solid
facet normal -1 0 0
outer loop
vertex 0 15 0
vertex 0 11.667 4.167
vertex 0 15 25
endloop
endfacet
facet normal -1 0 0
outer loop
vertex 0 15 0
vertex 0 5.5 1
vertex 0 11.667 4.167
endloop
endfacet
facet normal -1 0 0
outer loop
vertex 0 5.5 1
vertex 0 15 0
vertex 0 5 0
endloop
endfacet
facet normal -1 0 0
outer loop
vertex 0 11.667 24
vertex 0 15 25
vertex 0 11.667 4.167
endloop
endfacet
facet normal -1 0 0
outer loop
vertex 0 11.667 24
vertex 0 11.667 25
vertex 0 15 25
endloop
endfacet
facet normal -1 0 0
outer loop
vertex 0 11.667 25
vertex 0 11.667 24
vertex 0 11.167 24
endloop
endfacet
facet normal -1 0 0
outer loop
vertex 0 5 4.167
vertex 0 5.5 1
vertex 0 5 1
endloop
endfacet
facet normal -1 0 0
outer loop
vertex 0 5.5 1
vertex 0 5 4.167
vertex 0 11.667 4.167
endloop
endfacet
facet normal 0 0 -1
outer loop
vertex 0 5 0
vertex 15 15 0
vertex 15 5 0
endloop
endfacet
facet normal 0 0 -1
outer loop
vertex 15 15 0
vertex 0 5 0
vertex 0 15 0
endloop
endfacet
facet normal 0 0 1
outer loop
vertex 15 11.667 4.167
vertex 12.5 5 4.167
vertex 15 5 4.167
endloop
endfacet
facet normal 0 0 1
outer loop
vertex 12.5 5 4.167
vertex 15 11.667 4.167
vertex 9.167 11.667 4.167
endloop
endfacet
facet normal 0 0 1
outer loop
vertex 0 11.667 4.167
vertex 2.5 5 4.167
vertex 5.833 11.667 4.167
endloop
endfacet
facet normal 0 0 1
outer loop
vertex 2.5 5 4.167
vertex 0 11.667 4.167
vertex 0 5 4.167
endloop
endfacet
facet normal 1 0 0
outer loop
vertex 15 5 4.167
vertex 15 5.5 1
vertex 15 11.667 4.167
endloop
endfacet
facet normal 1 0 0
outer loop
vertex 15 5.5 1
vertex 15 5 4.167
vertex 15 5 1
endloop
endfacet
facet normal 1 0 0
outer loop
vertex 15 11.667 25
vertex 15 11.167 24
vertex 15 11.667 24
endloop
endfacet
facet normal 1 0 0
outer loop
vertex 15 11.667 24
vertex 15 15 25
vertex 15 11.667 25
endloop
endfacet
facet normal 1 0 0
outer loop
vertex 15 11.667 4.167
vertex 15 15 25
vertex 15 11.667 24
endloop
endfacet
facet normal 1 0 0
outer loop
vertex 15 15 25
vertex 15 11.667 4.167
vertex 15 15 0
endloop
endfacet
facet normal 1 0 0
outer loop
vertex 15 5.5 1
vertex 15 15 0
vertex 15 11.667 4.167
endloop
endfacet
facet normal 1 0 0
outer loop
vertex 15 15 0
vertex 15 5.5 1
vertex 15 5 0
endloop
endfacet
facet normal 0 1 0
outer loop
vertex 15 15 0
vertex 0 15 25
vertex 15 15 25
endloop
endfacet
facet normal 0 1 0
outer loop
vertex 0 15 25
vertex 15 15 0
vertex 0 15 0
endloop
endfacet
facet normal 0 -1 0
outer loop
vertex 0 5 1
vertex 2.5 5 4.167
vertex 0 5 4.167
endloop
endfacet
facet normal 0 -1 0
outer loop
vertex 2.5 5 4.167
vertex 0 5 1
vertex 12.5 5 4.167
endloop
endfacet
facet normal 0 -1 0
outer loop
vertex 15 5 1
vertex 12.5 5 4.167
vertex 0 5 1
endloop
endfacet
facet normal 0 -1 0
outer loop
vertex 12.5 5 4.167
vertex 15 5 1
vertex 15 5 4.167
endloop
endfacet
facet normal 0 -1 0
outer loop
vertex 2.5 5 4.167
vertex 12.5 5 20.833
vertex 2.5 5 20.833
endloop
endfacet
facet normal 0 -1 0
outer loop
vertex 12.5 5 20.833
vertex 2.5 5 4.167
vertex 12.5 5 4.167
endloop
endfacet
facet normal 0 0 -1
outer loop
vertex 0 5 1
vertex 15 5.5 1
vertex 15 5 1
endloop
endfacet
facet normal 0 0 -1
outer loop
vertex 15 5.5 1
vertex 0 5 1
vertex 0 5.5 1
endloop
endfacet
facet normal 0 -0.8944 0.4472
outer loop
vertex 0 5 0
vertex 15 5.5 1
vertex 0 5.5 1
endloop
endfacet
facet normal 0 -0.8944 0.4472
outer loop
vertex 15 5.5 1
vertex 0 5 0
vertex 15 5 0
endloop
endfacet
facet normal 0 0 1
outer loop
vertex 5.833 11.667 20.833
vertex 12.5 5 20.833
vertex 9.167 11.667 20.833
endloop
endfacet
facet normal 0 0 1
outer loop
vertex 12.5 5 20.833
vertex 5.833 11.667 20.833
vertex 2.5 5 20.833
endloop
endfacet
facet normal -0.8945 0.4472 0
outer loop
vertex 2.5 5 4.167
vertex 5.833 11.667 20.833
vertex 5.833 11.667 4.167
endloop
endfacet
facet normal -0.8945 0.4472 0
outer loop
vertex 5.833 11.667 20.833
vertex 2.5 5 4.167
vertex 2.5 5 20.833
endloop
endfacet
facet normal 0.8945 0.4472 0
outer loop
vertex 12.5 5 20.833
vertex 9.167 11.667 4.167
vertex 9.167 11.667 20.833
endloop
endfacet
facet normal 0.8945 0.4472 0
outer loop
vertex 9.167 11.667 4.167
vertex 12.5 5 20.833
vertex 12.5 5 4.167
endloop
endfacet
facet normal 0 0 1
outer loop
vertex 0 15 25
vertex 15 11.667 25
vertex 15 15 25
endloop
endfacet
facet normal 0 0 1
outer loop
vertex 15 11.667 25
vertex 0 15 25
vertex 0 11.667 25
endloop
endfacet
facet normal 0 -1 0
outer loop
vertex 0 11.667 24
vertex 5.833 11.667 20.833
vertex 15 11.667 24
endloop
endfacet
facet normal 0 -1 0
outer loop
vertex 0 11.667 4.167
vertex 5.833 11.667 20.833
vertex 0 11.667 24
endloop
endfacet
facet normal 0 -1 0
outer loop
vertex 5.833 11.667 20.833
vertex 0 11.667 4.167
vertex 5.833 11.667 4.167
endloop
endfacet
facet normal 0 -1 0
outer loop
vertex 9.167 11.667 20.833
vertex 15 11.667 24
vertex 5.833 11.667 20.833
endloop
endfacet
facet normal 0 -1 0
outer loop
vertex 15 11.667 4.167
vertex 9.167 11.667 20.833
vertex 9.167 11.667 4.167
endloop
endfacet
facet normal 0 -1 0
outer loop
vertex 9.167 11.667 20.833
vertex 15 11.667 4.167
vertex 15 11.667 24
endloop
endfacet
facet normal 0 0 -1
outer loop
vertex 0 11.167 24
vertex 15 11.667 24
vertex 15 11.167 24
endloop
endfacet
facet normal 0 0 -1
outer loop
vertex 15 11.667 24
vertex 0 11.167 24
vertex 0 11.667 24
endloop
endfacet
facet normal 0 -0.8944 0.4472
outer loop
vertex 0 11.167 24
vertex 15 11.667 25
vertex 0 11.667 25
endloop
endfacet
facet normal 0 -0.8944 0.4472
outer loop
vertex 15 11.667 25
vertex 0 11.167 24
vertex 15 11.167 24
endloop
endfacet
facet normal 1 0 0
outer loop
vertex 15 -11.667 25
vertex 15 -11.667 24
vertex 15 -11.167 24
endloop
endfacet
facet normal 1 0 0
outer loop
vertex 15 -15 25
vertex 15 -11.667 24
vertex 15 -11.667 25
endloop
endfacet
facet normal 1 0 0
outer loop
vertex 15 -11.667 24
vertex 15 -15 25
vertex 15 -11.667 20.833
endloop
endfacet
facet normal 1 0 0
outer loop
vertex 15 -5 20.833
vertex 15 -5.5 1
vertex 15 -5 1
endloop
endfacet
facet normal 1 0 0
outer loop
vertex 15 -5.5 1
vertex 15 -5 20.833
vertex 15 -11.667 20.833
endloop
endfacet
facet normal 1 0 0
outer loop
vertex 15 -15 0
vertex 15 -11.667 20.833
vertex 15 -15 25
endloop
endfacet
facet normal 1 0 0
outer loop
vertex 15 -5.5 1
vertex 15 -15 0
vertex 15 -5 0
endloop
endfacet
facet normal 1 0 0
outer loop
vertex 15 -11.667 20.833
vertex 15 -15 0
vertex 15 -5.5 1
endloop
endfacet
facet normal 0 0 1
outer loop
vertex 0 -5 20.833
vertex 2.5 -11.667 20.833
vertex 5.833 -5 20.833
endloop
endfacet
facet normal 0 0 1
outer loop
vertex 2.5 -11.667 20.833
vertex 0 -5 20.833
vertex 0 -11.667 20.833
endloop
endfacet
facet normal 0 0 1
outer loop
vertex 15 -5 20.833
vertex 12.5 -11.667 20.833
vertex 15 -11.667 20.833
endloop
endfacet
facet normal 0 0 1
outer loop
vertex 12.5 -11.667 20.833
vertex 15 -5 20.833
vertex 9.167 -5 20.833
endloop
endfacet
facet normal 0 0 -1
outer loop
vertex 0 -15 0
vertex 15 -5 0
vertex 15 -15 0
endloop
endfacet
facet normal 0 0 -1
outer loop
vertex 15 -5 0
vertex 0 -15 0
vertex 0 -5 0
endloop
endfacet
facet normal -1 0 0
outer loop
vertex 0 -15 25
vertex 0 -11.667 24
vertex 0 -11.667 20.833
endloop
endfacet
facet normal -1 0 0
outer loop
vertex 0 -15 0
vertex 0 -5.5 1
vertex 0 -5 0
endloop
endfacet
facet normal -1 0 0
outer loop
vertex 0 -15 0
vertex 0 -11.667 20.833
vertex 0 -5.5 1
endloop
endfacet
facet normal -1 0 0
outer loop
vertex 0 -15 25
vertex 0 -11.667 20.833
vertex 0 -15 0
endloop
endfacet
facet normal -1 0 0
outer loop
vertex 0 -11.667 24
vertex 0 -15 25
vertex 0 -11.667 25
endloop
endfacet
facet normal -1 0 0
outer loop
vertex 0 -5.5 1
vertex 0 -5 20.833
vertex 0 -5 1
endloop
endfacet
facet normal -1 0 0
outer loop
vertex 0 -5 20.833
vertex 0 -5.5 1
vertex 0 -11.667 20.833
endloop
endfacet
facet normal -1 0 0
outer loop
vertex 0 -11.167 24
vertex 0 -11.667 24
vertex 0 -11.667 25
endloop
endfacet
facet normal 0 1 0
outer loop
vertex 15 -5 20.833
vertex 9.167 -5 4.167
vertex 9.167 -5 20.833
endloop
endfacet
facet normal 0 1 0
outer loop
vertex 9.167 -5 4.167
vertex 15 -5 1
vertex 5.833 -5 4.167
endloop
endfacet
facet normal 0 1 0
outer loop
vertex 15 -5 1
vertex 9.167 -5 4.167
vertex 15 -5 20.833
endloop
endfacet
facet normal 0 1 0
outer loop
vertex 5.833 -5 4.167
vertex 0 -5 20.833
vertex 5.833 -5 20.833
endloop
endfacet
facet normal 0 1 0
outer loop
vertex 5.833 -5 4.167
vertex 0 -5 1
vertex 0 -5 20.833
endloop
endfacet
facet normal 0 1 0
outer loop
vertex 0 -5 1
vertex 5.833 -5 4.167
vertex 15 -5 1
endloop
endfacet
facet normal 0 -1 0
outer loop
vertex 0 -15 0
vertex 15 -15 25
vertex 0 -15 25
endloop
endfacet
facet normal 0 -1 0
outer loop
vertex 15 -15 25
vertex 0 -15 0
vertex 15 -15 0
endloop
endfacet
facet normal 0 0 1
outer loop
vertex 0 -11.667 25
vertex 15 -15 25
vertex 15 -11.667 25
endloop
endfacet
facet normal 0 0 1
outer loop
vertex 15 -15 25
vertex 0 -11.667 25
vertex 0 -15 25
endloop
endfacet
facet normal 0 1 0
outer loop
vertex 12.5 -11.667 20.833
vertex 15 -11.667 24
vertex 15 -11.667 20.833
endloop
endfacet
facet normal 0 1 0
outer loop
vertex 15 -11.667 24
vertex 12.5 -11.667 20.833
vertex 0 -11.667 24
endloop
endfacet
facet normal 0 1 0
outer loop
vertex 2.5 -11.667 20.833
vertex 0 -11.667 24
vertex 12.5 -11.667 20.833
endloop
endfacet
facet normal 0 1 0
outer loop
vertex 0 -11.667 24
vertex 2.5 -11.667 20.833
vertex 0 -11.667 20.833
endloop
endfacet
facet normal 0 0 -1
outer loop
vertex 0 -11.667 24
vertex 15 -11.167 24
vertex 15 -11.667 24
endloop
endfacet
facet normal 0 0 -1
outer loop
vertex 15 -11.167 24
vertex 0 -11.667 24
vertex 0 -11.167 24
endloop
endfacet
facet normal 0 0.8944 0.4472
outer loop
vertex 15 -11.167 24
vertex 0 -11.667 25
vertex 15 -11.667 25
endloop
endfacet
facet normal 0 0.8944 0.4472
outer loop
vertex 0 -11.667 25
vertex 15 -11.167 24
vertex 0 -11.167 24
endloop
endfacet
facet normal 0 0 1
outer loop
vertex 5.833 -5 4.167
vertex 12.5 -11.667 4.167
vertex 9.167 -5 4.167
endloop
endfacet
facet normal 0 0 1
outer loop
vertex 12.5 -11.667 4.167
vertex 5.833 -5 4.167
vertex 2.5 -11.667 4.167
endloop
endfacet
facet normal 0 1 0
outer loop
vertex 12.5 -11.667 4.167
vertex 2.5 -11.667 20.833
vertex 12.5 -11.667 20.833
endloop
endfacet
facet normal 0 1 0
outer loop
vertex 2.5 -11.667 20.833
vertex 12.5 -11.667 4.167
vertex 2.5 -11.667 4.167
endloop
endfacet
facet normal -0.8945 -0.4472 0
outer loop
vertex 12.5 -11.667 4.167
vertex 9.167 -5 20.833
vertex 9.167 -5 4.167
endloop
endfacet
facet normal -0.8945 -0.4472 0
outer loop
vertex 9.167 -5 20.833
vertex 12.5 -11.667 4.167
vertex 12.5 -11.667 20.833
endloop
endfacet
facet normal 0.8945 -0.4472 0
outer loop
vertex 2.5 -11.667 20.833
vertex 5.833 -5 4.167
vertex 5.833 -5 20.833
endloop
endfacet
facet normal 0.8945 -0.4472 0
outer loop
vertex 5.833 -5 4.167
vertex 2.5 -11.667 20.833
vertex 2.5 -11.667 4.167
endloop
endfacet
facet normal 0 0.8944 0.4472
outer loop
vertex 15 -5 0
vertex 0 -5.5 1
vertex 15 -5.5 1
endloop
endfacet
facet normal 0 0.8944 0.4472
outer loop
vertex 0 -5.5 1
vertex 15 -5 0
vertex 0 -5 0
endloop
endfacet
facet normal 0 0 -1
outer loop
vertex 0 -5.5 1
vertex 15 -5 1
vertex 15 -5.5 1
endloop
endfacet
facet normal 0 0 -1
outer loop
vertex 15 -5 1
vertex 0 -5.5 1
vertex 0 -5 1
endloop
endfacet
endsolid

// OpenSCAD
// Creates an interlocking "keyed" attachment point with a triangle shaped key
module tri_key(x, y, z)
{
	linear_extrude( height = z )
	{
		polygon( points = [ [ 0, 0 ], [ x, 0 ], [x/2, y ] ], paths = [ [ 0, 1 , 2] ] );
	}
}

// Creates a triangular ridge that has a sloped face to allow slipping in one direction but not the other. 90 degrees is unsloped, smaller angles are shallower sides
// x = protruding distance ("overlap"), y = ridge height, z = ridge length,
module one_way_ridge(x, y, z)
{
	translate( [ 0, 0, y ] )
	rotate( [ -90, 0, -90 ] )
	linear_extrude( height = z )
	polygon( points = [ [ 0, 0], [ x, 0 ], [ 0, y ] ], paths = [ [ 0, 1, 2 ] ] );
}

// Mounting block with a "key" piece, block designed to constrain it from sliding vertically
module male_key_block( x, y, z, key_x, key_y, key_z )
{
	// Parameters  may need to be experimented with, especially if printed on different scales
	// If experimenting, remember to modify the corresponding female connector

	// Base thickness is the size of the block stabilizing both one end of the key, and the slot for the corresponding base on the female connector
	base_thickness = (z - key_z)/2;
	y_overlap = y / 3;
	
	lock_height = 1;
	lock_overlap = 0.5;	

	union()
	{
		// Key
		translate( [ (x - key_x)/2, 0, base_thickness ] )
		tri_key( key_x, key_y + y_overlap, key_z );
		
		difference()
		{
			// Base block, stabilizes key
			translate( [ 0, 0, key_z + base_thickness] )
			cube( size = [ x, y, base_thickness ] );
			
			// Cutout for corresponding locking ridge
			translate( [ -0.001, 0 , z ] )
			rotate( [ 180, 0, 0 ] )
			one_way_ridge( lock_overlap, lock_height, x + 0.002);
		}
		
		// Mounting Side Block, union() or superglue to your part
		translate( [ 0, key_y, 0 ] )
		cube( size = [ x, y - key_y, key_z + base_thickness ] );
				
		translate( [ 0, key_y, 0 ] )
		one_way_ridge( lock_overlap, lock_height, x);
	}
}

// Mounting block with a cutout for a matching keyed block, designed to constrain it from sliding vertically
module female_key_block( x, y, z, key_x, key_y, key_z )
{
	// Parameters  may need to be experimented with, especially if printed on different scales
	// If experimenting, remember to modify the corresponding female connector
	
	// Base thickness is the size of the block stabilizing both one end of the key, and the slot for the corresponding base on the female connector
	base_thickness = (z - key_z)/2;	
	
	lock_height = 1;
	lock_overlap = 0.5;

	difference()
	{
		union()
		{
			// Main body, forms base and key slot is cut into
			cube( size = [ x, y, z - base_thickness ] );	
			
			// Block connecting locking ridge to main body
			translate( [ 0, 0, z - base_thickness ] )
			cube( size = [ x, y - key_y, base_thickness ] );

			// Locking ridge
			translate( [ 0, y - key_y , z ] )
			rotate( [ 180, 0, 0 ] )
			one_way_ridge( lock_overlap, lock_height, x);
		}
		
		// Slot for key
		translate( [ ( x - key_x)/2, y - key_y, z - key_z - base_thickness ] )
		tri_key( key_x, y, key_z );
	
		// Cutout for corresponding lock ridge
		translate( [ -0.001, y, 0 ] )
		one_way_ridge( lock_overlap, lock_height, x + 0.002);
	}
}



// Example:
length = 15;
depth = 15 * 2/3;
height = 25;

x = length;
y = depth;
z = height;
key_x = x * 2/3;
key_y = y * 2/3;
key_z =  z * 2/3;
lock_height = 1;
	
// Male Locking connector, Right side in "Right" view
translate ( [ x, 5, z ] )
rotate( a = [ 0, 180, 0] ) //, v = [ x/2, y/2, z/2 ] ) // Ignores v = [...] parameter??? This can be used to rotate around a new origin, such as the center of the object.
male_key_block( x, y, z, key_x, key_y, key_z );
	
// Female Locking connector, Left side in "Right" view
translate( [ 0, - (y + 5), 0 ] )
female_key_block( x, y, z, key_x, key_y, key_z );
